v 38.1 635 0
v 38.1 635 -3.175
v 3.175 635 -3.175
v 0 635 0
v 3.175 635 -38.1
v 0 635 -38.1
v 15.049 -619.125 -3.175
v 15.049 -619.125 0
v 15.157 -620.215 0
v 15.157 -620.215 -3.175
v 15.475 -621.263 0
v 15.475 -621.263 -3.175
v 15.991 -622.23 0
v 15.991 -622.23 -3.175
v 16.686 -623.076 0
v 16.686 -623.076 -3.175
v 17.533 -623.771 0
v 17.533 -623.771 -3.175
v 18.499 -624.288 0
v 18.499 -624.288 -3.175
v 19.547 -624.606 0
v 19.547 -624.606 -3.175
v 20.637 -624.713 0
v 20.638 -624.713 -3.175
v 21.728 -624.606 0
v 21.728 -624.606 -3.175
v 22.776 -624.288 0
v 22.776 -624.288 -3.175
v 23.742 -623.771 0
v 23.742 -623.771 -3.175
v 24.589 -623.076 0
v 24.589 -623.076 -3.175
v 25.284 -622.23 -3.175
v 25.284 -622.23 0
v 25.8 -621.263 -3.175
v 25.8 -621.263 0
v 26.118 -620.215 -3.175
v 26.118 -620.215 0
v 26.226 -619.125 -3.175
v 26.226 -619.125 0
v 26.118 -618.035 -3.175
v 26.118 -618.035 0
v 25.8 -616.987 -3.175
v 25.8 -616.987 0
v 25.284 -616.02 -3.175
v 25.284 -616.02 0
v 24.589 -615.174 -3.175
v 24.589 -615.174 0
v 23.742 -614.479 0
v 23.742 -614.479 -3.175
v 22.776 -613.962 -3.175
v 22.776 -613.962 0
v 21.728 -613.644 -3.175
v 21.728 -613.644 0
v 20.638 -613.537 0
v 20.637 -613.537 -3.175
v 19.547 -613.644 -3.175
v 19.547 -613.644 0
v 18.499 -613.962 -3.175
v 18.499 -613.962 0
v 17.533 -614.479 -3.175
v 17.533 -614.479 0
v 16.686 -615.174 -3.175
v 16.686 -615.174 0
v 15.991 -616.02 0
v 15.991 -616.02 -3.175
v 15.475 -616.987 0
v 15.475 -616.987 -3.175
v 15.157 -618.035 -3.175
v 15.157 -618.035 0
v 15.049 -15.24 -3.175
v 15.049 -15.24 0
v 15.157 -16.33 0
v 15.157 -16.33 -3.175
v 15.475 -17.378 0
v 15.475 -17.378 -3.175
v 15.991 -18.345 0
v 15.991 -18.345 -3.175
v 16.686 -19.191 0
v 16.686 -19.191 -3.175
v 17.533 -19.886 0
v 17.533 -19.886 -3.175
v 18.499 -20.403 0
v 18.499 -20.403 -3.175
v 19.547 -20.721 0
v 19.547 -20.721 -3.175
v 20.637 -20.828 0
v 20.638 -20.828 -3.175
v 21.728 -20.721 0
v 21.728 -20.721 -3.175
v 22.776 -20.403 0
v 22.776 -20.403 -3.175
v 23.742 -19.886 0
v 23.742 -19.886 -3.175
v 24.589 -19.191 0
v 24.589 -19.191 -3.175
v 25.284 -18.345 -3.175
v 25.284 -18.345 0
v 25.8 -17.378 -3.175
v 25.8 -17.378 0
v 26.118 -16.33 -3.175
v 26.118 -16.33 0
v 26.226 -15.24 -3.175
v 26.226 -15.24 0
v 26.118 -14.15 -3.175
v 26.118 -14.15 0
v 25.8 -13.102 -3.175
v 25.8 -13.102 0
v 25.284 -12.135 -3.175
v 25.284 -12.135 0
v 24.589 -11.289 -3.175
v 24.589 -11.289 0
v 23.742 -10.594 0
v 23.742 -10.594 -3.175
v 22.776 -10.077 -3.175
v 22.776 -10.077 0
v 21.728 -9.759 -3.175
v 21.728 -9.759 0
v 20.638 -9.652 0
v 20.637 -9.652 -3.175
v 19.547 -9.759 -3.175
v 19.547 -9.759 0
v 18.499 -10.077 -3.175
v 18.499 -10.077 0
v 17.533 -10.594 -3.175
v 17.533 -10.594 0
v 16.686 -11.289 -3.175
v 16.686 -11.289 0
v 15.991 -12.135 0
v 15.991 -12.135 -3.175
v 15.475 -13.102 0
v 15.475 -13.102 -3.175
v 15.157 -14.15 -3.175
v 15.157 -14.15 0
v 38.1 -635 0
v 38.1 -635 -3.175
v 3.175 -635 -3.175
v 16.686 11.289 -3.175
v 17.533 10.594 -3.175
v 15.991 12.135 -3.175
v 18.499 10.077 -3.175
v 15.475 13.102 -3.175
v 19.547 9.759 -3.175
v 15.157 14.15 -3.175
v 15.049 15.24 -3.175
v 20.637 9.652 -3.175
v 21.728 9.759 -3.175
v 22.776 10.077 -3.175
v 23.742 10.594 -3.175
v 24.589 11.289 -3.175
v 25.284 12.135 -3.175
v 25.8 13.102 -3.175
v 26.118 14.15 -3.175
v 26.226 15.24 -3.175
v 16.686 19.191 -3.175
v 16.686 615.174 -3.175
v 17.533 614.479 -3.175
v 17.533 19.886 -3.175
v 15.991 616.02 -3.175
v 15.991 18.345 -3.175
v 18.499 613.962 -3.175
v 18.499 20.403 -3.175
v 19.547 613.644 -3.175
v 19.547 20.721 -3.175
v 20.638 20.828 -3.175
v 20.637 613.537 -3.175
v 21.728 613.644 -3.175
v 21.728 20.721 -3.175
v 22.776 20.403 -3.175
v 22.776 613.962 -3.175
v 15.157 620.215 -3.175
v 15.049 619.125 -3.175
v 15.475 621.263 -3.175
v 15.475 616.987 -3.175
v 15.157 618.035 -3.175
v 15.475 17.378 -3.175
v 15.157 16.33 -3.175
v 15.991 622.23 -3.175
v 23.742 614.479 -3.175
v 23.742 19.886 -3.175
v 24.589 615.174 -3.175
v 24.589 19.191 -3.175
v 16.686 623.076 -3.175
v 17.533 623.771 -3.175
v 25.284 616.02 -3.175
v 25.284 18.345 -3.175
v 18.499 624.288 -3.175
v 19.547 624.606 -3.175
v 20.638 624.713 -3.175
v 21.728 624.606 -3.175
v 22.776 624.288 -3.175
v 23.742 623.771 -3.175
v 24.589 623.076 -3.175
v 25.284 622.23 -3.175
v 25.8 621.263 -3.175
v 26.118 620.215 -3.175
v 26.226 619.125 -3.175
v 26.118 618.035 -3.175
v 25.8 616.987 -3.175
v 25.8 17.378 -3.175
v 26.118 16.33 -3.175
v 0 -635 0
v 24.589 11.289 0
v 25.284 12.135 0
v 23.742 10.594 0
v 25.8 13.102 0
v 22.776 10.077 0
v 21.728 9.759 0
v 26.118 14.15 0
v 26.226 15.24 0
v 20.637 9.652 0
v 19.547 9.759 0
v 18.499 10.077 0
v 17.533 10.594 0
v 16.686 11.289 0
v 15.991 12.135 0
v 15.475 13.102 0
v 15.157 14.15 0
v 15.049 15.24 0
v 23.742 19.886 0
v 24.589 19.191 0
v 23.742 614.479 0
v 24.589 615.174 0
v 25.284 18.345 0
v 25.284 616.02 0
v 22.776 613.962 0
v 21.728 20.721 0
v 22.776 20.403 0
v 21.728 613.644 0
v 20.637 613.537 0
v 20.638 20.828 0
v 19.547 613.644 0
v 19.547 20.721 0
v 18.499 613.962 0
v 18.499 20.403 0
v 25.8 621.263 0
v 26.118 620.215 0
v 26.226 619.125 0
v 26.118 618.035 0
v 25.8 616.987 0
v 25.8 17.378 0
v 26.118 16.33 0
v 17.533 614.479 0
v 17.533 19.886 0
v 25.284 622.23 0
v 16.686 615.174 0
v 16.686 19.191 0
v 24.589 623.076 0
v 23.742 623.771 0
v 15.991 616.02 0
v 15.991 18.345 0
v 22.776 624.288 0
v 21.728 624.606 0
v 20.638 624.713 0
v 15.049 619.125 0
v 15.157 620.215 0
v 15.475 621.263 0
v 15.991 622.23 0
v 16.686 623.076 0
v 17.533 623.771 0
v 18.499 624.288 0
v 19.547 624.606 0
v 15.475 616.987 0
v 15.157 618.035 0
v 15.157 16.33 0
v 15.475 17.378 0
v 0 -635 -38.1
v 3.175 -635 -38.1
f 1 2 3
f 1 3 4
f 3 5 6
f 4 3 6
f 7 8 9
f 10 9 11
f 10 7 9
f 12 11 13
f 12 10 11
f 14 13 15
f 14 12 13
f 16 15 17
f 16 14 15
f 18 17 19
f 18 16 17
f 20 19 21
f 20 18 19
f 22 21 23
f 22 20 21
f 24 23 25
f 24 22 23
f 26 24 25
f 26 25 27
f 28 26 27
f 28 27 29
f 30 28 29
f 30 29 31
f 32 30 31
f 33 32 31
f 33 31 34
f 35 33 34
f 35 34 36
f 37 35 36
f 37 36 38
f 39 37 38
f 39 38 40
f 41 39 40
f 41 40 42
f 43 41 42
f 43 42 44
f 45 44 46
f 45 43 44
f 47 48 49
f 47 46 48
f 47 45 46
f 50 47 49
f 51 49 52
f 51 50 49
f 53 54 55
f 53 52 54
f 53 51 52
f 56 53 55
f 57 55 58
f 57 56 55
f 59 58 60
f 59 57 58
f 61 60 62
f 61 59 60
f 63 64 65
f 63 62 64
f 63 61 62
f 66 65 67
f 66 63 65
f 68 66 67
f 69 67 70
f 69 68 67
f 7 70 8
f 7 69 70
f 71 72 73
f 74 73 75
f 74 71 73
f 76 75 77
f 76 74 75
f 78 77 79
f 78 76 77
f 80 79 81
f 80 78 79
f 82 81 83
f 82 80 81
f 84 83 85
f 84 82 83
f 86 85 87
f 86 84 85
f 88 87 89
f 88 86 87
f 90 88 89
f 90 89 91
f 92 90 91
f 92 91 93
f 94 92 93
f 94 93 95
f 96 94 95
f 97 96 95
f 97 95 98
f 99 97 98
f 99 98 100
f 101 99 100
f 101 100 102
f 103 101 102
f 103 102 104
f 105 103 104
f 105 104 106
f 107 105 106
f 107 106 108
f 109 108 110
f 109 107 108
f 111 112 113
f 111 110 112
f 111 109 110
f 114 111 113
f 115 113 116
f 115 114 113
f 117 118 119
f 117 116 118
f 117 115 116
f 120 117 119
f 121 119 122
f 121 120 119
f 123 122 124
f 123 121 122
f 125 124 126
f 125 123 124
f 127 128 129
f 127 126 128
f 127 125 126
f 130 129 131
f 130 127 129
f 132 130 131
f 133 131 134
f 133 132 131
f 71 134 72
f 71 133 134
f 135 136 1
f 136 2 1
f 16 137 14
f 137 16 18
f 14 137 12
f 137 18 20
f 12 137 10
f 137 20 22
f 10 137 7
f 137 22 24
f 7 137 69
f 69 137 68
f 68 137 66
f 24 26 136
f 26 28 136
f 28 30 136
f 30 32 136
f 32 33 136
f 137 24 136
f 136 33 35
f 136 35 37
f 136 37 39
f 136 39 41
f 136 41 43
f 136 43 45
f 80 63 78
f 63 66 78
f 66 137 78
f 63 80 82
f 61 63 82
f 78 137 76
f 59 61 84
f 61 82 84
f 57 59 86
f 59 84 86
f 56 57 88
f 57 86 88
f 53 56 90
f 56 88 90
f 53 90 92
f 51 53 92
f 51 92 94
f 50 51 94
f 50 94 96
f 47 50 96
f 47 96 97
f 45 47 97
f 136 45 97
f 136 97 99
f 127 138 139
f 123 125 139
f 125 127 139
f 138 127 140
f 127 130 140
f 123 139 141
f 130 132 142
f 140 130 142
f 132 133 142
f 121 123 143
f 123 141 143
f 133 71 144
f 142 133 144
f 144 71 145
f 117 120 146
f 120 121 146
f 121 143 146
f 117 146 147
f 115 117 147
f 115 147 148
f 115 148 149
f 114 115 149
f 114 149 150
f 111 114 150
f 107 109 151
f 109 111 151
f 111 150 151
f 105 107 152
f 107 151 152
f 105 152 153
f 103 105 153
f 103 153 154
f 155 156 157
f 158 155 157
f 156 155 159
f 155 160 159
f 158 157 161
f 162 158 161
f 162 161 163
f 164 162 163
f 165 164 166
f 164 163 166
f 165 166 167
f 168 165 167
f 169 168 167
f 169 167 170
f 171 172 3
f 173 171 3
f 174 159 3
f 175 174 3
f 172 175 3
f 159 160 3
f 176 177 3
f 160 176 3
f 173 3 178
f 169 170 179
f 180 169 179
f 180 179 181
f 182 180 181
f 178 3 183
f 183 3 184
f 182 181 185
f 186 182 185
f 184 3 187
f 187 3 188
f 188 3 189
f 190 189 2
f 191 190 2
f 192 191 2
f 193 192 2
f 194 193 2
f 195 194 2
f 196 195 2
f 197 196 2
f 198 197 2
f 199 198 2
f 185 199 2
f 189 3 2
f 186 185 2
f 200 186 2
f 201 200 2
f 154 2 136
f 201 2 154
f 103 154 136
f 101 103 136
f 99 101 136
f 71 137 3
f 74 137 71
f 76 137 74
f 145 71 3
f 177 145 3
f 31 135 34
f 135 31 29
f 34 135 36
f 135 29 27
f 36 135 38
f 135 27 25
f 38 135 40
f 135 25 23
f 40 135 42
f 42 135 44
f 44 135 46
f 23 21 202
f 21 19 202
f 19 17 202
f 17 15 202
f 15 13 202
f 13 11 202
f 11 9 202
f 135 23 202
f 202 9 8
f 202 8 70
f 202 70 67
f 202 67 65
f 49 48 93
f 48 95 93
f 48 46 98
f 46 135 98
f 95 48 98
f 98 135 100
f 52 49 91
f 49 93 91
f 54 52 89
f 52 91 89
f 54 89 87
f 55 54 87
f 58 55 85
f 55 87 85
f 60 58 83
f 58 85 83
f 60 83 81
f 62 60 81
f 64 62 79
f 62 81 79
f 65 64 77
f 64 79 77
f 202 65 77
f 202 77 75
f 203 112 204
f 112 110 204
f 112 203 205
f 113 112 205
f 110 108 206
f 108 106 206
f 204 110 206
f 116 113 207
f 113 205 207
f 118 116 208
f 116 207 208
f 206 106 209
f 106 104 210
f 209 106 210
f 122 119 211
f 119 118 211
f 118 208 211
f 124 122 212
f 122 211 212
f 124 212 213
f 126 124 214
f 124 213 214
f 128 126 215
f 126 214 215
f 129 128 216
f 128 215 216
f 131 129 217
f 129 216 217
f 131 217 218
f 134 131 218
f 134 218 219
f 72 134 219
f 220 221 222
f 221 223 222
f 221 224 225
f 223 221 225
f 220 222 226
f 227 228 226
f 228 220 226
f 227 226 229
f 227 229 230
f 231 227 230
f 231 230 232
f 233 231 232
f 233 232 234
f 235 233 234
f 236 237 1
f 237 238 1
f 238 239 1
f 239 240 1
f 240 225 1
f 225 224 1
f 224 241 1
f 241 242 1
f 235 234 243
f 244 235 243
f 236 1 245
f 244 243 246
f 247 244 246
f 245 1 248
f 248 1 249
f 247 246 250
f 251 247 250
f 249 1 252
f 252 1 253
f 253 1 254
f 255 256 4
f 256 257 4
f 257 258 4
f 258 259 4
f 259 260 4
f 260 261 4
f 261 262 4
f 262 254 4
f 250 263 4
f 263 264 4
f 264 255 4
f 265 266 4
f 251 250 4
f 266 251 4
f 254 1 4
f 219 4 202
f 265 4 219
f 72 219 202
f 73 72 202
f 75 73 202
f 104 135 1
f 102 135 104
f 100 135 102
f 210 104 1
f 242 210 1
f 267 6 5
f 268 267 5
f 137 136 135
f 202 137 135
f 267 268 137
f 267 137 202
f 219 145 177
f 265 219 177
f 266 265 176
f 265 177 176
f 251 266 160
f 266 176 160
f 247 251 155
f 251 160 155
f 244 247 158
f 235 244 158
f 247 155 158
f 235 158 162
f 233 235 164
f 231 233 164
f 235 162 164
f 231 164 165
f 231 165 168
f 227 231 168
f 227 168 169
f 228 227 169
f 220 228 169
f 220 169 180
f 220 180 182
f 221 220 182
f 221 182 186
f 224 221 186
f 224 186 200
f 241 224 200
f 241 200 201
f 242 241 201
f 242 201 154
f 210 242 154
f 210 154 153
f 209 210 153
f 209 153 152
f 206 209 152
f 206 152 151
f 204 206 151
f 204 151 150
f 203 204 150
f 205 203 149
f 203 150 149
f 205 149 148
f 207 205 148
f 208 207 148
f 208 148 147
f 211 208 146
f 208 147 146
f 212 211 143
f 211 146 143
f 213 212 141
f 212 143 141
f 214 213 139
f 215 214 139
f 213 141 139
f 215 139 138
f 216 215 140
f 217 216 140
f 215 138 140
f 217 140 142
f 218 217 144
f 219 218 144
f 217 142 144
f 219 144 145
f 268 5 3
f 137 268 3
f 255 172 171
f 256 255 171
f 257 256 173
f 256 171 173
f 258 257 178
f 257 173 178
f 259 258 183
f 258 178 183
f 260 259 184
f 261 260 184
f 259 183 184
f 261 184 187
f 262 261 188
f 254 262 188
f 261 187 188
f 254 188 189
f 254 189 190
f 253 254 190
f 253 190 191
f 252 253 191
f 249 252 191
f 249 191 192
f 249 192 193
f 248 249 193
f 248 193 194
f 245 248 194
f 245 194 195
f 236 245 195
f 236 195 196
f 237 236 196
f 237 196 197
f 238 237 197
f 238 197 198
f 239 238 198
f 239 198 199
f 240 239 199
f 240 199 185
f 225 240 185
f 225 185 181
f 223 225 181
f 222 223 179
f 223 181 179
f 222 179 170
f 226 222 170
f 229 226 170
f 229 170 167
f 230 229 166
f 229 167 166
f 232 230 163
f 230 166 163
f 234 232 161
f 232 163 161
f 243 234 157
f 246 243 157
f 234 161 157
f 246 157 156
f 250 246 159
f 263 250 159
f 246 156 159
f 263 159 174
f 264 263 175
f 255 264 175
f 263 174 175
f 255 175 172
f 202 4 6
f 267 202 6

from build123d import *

# Parameters (mm, degrees)
BOSS_EXTRUDE1_DEPTH = 635
SKETCH19_R          = 5.588
CUT_EXTRUDE2_DEPTH  = 638.099965174


with BuildPart() as part:
    # Sketch18 → Boss-Extrude1 (new, symmetric)
    with BuildSketch(Plane(origin=(0, 0, 0), x_dir=(1, 0, 0), z_dir=(0, 1, 0))):
        Polygon((3.175, 38.1), (3.175, 3.175), (38.1, 3.175), (38.1, 0), (0, 0), (0, 38.1), align=None)
    extrude(amount=BOSS_EXTRUDE1_DEPTH, both=True)

    # Sketch19 → Cut-Extrude2 (cut, through all)
    with BuildSketch(Plane(origin=(0, 0, -3.175), x_dir=(-1, 0, 0), z_dir=(0, 0, -1))):
        with Locations((-20.6375, 619.125)):
            Circle(SKETCH19_R)
        with Locations((-20.6375, 15.24)):
            Circle(SKETCH19_R)
    cut_extrude2 = extrude(amount=-CUT_EXTRUDE2_DEPTH, mode=Mode.SUBTRACT)

    # Mirror2: Cut-Extrude2 across plane
    add(cut_extrude2.mirror(Plane.ZX), mode=Mode.SUBTRACT)


solid = part.part
